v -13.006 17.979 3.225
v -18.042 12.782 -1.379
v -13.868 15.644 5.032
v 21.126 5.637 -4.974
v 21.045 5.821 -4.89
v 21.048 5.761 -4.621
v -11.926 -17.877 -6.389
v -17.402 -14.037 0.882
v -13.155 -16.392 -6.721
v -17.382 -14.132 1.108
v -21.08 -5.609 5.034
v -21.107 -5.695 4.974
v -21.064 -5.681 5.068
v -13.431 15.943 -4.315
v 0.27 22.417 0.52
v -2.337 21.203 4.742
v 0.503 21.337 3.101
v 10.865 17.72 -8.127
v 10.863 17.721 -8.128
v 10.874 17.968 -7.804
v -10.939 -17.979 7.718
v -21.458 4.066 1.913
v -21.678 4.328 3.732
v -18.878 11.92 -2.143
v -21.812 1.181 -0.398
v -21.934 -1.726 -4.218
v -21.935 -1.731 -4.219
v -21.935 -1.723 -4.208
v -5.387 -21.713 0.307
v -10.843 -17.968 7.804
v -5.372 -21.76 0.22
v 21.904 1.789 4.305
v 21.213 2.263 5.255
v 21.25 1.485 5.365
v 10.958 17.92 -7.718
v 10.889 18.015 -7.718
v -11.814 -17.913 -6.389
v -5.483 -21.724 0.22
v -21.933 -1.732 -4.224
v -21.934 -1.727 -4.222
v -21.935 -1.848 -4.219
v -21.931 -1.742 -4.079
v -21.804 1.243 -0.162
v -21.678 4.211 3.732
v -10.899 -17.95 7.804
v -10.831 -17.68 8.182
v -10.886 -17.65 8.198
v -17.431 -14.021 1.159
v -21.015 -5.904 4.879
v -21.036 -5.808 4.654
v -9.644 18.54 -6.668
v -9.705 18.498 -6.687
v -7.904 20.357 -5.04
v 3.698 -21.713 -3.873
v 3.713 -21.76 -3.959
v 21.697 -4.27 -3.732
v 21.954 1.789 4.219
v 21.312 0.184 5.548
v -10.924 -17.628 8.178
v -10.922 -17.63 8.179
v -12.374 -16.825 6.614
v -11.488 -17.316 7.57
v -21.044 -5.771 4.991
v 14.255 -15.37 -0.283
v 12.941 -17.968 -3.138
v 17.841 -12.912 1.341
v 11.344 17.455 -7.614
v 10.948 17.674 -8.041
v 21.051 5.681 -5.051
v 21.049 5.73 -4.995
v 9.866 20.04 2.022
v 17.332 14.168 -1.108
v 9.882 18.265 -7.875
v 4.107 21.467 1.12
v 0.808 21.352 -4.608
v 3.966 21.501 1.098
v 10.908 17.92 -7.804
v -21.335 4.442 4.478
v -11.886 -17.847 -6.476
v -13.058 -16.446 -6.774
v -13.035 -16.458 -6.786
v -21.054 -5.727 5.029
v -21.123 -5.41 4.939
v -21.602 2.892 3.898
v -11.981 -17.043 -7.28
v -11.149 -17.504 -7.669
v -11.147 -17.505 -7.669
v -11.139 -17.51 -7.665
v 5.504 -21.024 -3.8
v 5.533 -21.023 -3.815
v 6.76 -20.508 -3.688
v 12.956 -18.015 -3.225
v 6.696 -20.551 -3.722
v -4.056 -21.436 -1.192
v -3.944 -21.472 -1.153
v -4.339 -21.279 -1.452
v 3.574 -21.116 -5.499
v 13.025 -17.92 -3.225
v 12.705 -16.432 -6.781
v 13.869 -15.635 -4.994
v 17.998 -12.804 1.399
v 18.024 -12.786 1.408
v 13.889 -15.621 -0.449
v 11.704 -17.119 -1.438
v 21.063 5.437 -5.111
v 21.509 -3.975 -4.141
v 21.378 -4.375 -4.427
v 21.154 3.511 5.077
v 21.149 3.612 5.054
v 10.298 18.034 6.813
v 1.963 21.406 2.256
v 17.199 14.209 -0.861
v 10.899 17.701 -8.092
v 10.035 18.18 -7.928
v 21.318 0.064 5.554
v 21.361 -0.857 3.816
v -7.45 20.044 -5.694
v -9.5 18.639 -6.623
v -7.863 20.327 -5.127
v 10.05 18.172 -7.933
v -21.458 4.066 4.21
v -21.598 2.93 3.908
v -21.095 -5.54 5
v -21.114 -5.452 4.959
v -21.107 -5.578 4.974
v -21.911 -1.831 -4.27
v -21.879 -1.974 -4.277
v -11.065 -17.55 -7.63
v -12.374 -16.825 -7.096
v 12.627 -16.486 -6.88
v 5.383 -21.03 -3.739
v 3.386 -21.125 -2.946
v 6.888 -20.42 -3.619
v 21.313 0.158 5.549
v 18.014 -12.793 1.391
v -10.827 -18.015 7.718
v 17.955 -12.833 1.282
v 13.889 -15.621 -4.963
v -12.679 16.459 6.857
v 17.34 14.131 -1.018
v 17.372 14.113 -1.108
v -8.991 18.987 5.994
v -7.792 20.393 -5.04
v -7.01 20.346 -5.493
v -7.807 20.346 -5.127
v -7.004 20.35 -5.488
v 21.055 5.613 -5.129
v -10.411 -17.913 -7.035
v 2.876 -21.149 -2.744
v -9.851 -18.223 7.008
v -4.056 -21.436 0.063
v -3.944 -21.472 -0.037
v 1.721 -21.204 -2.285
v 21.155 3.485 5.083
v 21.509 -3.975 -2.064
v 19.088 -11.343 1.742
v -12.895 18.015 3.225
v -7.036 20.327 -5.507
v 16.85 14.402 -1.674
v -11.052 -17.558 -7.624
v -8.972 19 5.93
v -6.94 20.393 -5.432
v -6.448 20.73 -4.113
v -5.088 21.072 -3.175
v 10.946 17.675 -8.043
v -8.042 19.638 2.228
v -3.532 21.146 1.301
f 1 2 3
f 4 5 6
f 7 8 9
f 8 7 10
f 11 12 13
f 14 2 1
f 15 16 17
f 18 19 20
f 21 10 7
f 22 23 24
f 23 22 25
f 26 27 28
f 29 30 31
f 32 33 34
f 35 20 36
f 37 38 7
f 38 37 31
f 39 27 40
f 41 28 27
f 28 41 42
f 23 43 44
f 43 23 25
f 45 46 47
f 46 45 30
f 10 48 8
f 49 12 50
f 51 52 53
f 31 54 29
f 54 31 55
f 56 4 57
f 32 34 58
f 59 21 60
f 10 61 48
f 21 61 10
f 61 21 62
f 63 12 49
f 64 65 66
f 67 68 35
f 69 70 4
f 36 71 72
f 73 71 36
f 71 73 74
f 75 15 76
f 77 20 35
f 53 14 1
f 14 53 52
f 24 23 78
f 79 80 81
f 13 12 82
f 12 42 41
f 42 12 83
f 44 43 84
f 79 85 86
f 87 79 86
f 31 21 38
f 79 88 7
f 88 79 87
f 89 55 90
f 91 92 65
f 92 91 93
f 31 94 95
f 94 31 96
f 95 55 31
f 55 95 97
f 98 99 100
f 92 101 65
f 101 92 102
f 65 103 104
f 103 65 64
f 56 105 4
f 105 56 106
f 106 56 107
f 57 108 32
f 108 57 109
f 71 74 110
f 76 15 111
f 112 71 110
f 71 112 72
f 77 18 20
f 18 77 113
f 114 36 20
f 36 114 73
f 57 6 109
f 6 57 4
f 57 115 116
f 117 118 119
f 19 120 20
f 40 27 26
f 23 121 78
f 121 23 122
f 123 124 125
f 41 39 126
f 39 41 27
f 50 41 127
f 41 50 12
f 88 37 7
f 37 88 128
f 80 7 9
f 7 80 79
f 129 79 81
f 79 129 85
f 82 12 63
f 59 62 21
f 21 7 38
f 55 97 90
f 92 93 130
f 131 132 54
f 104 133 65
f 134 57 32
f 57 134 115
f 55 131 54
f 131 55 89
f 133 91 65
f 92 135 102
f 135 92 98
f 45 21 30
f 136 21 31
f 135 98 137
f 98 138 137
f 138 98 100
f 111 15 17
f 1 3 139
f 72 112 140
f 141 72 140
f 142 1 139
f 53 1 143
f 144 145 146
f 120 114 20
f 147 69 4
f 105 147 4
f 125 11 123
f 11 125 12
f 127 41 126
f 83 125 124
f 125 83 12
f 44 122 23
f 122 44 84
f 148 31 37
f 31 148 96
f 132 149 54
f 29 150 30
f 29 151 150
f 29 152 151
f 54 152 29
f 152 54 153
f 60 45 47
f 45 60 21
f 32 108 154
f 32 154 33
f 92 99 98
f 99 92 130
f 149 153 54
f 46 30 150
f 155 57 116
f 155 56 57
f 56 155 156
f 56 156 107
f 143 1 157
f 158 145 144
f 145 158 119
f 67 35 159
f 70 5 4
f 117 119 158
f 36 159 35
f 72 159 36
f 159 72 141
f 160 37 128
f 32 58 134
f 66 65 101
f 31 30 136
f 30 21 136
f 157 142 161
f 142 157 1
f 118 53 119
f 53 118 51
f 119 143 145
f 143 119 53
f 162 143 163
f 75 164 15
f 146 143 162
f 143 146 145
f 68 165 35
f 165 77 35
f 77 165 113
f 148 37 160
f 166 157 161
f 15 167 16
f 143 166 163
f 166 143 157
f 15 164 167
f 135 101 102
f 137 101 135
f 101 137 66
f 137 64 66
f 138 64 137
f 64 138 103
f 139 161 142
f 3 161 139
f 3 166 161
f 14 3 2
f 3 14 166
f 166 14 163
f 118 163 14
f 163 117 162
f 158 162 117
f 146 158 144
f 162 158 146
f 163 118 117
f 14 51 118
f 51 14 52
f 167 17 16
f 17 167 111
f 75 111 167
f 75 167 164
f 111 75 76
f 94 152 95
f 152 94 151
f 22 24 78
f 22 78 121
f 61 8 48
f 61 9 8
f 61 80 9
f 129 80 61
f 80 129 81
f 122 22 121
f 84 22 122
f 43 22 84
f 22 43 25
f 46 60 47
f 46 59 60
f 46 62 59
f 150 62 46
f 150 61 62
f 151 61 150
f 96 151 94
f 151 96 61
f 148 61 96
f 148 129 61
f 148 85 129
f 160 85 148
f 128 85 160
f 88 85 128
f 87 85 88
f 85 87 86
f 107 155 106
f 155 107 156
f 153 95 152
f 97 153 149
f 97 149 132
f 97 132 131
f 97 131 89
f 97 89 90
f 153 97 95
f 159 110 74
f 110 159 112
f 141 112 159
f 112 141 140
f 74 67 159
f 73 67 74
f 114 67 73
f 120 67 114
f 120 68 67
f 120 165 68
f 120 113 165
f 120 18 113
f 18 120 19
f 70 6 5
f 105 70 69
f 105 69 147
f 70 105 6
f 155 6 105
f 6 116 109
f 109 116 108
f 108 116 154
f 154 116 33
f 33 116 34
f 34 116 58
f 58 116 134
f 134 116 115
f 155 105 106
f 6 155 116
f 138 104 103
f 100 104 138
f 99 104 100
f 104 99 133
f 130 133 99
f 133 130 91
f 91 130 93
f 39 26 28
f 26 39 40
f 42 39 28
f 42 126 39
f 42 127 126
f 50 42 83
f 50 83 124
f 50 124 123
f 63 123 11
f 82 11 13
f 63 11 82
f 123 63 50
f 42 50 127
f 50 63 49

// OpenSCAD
// Auto-generated OpenSCAD file

    inner_points = 10*[[-1.652954838618672, 0.7331031267239583, 1.309016994374885], [1.8705714695316353, -1.2202296084263586, 9.520162436160717e-14], [-2.1377569026756937, 0.40075020963339975, 0.49999999999995376], [1.3857694054746135, -1.5525825255169172, -0.8090169943748362], [-1.3826041813849252, 1.5558488481550894, 0.8090169943748362], [2.140922126765382, -0.3974838869952276, -0.49999999999995376], [-1.867406245441947, 1.2234959310645308, -9.520162436160717e-14], [1.6561200627083603, -0.7298368040857861, -1.309016994374885], [-0.7445241014447653, -1.3442341281397892, 1.618033988749972], [0.08726762778757838, -1.8053534363108568, 1.3090169943750618], [-1.2293261655017869, -1.6765870452303477, 0.8090169943750405], [-0.3975344362694432, -2.1377063534014153, 0.5000000000001303], [0.4006996603591313, 2.1409726760395875, -0.5000000000001303], [1.232491389591475, 1.67985336786852, -0.8090169943750405], [-0.08410240369789032, 1.808619758949029, -1.3090169943750618], [0.7476893255344533, 1.3475004507779613, -1.618033988749972], [1.3091303975330184, 0.0636354211759657, 1.8090169943749566], [-2.199388481084053, -0.10273410018217301, -0.36180339887500484], [-0.7445241014447332, -1.3442341281399923, -1.6180339887498179], [1.579481054766765, 0.8863811426070967, 1.3090169943749077], [-1.929037823850306, 0.7200116212489581, -0.8618033988750537], [-0.47417344421098645, -0.5214884067088612, -2.118033988749867], [2.140922126765372, -0.3974838869951649, 0.5000000000000463], [-1.3675967518516992, -0.5638534083533033, -1.670820393249915], [0.8716938452479853, -1.2675951201984228, -1.6180339887498065], [-1.5763158306771028, -0.8831148199687601, 1.3090169943749874], [0.6013431880142225, -2.0903408416294527, 0.5000000000001372], [-0.5981779639245345, 2.093607164267625, -0.5000000000001372], [1.579481054766791, 0.8863811426069322, -1.3090169943749874], [0.5247041800726373, -0.4741228949366325, 2.11803398874993], [-1.2293261655017709, -1.6765870452304492, -0.8090169943748543], [1.232491389591459, 1.6798533678686214, 0.8090169943748543], [-0.5215389559829493, 0.4773892175748047, -2.11803398874993], [-1.305965173443366, -0.060369098537566515, 1.8090169943749381], [1.3857694054745975, -1.5525825255168155, 0.8090169943750587], [-2.090391390903731, -0.5981274146502662, 0.5000000000000169], [0.6013431880142324, -2.0903408416295153, -0.49999999999986267], [-0.5981779639245444, 2.0936071642676874, 0.49999999999986267], [2.0935566149934193, 0.6013937372884384, -0.5000000000000169], [-1.3826041813849093, 1.5558488481549877, -0.8090169943750587], [1.3091303975330542, 0.06363542117573866, -1.8090169943749381], [-0.4741734442110284, -0.5214884067085954, 2.1180339887499233], [0.8716938452479531, -1.26759512019822, 1.6180339887499833], [-1.743401725728415, -1.3915996399118535, 7.027711745877241e-14], [-0.39753443626943324, -2.137706353401478, -0.49999999999986966], [0.40069966035912136, 2.14097267603965, 0.49999999999986966], [1.7465669498181031, 1.3948659625500257, -7.027711745877241e-14], [-0.8685286211582651, 1.2708614428363922, -1.6180339887499833], [0.47733866830071653, 0.5247547293467676, -2.1180339887499233], [1.6561200627083341, -0.7298368040856218, 1.3090169943750098], [-1.8523988159087368, -0.8962063254437607, -0.8618033988749515], [0.08726762778760436, -1.8053534363110213, -1.3090169943748333], [2.093556614993409, 0.601393737288501, 0.4999999999999831], [-1.4149622636236618, 0.43502421593036245, -1.6708203932499783], [0.5247041800726793, -0.47412289493689824, -2.11803398874986]];

    outer_points = 10*[[0.4513288900262728, -0.2057852874430356, 2.1771593019343873], [-1.302649108448602, -0.7848281063879728, -1.6349978963843712], [0.3941935542206573, 0.7848281063879728, 2.052979362471562], [-1.3597844442542175, 0.2057852874430356, -1.7591778358471963], [1.3597844442542175, -0.2057852874430356, 1.7591778358471963], [-0.3941935542206573, -0.7848281063879728, -2.052979362471562], [1.302649108448602, 0.7848281063879728, 1.6349978963843712], [-0.4513288900262728, 0.2057852874430356, -2.1771593019343873], [-1.688543053881056, -0.4269599633384501, 1.3973530414307818], [-2.102601092560149, -0.5636534304925583, 0.4974248017124077], [-1.7456783896866714, 0.5636534304925583, 1.273173101967957], [-2.1597364283657643, 0.4269599633384501, 0.373244862249583], [2.1597364283657643, -0.4269599633384501, -0.373244862249583], [1.7456783896866714, -0.5636534304925583, -1.273173101967957], [2.102601092560149, 0.5636534304925583, -0.4974248017124077], [1.688543053881056, 0.4269599633384501, -1.3973530414307818], [-0.5402422132585865, -2.1664995714220154, 0.022043945687575728], [0.15791777208586583, 1.609728484671791, 1.5394493042628863], [-0.7822713796484513, 2.029806104267907, -0.5039907193187587], [0.3682133409693583, -2.1664995714220154, -0.3959375203996154], [1.0663733263138107, 1.609728484671791, 1.121467838175695], [0.1261841745794935, 2.029806104267907, -0.9219721854059499], [-0.6742469030791683, -1.544010572482048, -1.4654318282511805], [0.02391308226528406, 2.232217483611758, 0.051973530324130296], [-0.8238291541769085, 1.0494489622784173, -1.79053913048576], [-1.1014025269441718, 0.17893407152476137, 1.9341569349947676], [-2.185420545521156, -0.17893407152476137, -0.4218857840237987], [2.185420545521156, 0.17893407152476137, 0.4218857840237987], [1.1014025269441718, -0.17893407152476137, -1.9341569349947676], [-1.0858249656670136, -1.792036464295737, 0.7717884632905911], [-1.292542552570369, 1.792036464295737, 0.32250122159318684], [1.292542552570369, -1.792036464295737, -0.32250122159318684], [1.0858249656670136, 1.792036464295737, -0.7717884632905911], [-0.47300032157473804, -0.5802483945693141, 2.103723003127959], [-1.81292028137052, -1.0225977463601432, -0.8085059554724263], [-0.5654472368668626, 1.0225977463601432, 1.9027956403562043], [-1.9053671966626446, 0.5802483945693141, -1.0094333182441808], [1.9053671966626446, -0.5802483945693141, 1.0094333182441808], [0.5654472368668626, -1.0225977463601432, -1.9027956403562043], [1.81292028137052, 1.0225977463601432, 0.8085059554724263], [0.47300032157473804, 0.5802483945693141, -2.103723003127959], [-1.0601408485116224, -1.1861424294325253, 1.566919109563973], [-1.7301008284095134, -1.40731710532794, 0.11080463026378029], [-1.2097230996093626, 1.40731710532794, 1.2418118073293933], [-1.8796830795072537, 1.1861424294325253, -0.21430267197079933], [1.8796830795072537, -1.1861424294325253, 0.21430267197079933], [1.2097230996093626, -1.40731710532794, -1.2418118073293933], [1.7301008284095134, 1.40731710532794, -0.11080463026378029], [1.0601408485116224, 1.1861424294325253, -1.566919109563973], [-1.1845180760010863, -1.7817802124542186, -0.638939887339235], [-0.4863580906566339, 1.994447843639588, 0.8784654712360758], [-1.3694119065853356, 1.4239120694046958, -1.0407946128827448], [0.28539388800835175, -1.7817802124542186, -1.3152481061358219], [0.9835538733528042, 1.994447843639588, 0.202157252439489], [0.1005000574241024, 1.4239120694046958, -1.7171028316793315]];

    // Convex hull for inner set (I)
    module inner_hull() {
        hull() {
            for (p = inner_points) {
                translate(p) sphere(r=0.1);
            }
        }
    }

    // Convex hull for outer set (O) minus inner hull (O \ I)
    module outer_minus_inner() {
        difference() {
            hull() {
                for (p = outer_points) {
                    translate(p) sphere(r=0.1);
                }
            }
            inner_hull(); // Subtract inner hull
        }
    }

    // Convex hull for outer set (O) minus all translated inner hulls
    module outer_minus_AllTranslationInner() {
        difference() {
            hull() {
                for (p = outer_points) {
                    translate(p) sphere(r=0.1);
                }
            }
            hull() {
                translate([0,0,50]) inner_hull();
                translate([0,0,-50]) inner_hull();
            }; // Subtract translated inner hulls
        }
    }

    // Difference between outer_minus_inner and outer_minus_AllTranslationInner
    module outer_minus_inner_diff() {
        difference() {
            // Outer minus inner
            difference() {
                hull() {
                    for (p = outer_points) {
                        translate(p) sphere(r=0.1);
                    }
                }
                inner_hull();
            }

            // Subtract Outer minus AllTranslationInner
            difference() {
                hull() {
                    for (p = outer_points) {
                        translate(p) sphere(r=0.1);
                    }
                }
                hull() {
                    translate([0,0,50]) inner_hull();
                    translate([0,0,-50]) inner_hull();
                };
            }
        }
    }

    // Rendering all with colors applied
    color([0, 1, 0, 1]) outer_minus_AllTranslationInner(); // Opaque green
    
